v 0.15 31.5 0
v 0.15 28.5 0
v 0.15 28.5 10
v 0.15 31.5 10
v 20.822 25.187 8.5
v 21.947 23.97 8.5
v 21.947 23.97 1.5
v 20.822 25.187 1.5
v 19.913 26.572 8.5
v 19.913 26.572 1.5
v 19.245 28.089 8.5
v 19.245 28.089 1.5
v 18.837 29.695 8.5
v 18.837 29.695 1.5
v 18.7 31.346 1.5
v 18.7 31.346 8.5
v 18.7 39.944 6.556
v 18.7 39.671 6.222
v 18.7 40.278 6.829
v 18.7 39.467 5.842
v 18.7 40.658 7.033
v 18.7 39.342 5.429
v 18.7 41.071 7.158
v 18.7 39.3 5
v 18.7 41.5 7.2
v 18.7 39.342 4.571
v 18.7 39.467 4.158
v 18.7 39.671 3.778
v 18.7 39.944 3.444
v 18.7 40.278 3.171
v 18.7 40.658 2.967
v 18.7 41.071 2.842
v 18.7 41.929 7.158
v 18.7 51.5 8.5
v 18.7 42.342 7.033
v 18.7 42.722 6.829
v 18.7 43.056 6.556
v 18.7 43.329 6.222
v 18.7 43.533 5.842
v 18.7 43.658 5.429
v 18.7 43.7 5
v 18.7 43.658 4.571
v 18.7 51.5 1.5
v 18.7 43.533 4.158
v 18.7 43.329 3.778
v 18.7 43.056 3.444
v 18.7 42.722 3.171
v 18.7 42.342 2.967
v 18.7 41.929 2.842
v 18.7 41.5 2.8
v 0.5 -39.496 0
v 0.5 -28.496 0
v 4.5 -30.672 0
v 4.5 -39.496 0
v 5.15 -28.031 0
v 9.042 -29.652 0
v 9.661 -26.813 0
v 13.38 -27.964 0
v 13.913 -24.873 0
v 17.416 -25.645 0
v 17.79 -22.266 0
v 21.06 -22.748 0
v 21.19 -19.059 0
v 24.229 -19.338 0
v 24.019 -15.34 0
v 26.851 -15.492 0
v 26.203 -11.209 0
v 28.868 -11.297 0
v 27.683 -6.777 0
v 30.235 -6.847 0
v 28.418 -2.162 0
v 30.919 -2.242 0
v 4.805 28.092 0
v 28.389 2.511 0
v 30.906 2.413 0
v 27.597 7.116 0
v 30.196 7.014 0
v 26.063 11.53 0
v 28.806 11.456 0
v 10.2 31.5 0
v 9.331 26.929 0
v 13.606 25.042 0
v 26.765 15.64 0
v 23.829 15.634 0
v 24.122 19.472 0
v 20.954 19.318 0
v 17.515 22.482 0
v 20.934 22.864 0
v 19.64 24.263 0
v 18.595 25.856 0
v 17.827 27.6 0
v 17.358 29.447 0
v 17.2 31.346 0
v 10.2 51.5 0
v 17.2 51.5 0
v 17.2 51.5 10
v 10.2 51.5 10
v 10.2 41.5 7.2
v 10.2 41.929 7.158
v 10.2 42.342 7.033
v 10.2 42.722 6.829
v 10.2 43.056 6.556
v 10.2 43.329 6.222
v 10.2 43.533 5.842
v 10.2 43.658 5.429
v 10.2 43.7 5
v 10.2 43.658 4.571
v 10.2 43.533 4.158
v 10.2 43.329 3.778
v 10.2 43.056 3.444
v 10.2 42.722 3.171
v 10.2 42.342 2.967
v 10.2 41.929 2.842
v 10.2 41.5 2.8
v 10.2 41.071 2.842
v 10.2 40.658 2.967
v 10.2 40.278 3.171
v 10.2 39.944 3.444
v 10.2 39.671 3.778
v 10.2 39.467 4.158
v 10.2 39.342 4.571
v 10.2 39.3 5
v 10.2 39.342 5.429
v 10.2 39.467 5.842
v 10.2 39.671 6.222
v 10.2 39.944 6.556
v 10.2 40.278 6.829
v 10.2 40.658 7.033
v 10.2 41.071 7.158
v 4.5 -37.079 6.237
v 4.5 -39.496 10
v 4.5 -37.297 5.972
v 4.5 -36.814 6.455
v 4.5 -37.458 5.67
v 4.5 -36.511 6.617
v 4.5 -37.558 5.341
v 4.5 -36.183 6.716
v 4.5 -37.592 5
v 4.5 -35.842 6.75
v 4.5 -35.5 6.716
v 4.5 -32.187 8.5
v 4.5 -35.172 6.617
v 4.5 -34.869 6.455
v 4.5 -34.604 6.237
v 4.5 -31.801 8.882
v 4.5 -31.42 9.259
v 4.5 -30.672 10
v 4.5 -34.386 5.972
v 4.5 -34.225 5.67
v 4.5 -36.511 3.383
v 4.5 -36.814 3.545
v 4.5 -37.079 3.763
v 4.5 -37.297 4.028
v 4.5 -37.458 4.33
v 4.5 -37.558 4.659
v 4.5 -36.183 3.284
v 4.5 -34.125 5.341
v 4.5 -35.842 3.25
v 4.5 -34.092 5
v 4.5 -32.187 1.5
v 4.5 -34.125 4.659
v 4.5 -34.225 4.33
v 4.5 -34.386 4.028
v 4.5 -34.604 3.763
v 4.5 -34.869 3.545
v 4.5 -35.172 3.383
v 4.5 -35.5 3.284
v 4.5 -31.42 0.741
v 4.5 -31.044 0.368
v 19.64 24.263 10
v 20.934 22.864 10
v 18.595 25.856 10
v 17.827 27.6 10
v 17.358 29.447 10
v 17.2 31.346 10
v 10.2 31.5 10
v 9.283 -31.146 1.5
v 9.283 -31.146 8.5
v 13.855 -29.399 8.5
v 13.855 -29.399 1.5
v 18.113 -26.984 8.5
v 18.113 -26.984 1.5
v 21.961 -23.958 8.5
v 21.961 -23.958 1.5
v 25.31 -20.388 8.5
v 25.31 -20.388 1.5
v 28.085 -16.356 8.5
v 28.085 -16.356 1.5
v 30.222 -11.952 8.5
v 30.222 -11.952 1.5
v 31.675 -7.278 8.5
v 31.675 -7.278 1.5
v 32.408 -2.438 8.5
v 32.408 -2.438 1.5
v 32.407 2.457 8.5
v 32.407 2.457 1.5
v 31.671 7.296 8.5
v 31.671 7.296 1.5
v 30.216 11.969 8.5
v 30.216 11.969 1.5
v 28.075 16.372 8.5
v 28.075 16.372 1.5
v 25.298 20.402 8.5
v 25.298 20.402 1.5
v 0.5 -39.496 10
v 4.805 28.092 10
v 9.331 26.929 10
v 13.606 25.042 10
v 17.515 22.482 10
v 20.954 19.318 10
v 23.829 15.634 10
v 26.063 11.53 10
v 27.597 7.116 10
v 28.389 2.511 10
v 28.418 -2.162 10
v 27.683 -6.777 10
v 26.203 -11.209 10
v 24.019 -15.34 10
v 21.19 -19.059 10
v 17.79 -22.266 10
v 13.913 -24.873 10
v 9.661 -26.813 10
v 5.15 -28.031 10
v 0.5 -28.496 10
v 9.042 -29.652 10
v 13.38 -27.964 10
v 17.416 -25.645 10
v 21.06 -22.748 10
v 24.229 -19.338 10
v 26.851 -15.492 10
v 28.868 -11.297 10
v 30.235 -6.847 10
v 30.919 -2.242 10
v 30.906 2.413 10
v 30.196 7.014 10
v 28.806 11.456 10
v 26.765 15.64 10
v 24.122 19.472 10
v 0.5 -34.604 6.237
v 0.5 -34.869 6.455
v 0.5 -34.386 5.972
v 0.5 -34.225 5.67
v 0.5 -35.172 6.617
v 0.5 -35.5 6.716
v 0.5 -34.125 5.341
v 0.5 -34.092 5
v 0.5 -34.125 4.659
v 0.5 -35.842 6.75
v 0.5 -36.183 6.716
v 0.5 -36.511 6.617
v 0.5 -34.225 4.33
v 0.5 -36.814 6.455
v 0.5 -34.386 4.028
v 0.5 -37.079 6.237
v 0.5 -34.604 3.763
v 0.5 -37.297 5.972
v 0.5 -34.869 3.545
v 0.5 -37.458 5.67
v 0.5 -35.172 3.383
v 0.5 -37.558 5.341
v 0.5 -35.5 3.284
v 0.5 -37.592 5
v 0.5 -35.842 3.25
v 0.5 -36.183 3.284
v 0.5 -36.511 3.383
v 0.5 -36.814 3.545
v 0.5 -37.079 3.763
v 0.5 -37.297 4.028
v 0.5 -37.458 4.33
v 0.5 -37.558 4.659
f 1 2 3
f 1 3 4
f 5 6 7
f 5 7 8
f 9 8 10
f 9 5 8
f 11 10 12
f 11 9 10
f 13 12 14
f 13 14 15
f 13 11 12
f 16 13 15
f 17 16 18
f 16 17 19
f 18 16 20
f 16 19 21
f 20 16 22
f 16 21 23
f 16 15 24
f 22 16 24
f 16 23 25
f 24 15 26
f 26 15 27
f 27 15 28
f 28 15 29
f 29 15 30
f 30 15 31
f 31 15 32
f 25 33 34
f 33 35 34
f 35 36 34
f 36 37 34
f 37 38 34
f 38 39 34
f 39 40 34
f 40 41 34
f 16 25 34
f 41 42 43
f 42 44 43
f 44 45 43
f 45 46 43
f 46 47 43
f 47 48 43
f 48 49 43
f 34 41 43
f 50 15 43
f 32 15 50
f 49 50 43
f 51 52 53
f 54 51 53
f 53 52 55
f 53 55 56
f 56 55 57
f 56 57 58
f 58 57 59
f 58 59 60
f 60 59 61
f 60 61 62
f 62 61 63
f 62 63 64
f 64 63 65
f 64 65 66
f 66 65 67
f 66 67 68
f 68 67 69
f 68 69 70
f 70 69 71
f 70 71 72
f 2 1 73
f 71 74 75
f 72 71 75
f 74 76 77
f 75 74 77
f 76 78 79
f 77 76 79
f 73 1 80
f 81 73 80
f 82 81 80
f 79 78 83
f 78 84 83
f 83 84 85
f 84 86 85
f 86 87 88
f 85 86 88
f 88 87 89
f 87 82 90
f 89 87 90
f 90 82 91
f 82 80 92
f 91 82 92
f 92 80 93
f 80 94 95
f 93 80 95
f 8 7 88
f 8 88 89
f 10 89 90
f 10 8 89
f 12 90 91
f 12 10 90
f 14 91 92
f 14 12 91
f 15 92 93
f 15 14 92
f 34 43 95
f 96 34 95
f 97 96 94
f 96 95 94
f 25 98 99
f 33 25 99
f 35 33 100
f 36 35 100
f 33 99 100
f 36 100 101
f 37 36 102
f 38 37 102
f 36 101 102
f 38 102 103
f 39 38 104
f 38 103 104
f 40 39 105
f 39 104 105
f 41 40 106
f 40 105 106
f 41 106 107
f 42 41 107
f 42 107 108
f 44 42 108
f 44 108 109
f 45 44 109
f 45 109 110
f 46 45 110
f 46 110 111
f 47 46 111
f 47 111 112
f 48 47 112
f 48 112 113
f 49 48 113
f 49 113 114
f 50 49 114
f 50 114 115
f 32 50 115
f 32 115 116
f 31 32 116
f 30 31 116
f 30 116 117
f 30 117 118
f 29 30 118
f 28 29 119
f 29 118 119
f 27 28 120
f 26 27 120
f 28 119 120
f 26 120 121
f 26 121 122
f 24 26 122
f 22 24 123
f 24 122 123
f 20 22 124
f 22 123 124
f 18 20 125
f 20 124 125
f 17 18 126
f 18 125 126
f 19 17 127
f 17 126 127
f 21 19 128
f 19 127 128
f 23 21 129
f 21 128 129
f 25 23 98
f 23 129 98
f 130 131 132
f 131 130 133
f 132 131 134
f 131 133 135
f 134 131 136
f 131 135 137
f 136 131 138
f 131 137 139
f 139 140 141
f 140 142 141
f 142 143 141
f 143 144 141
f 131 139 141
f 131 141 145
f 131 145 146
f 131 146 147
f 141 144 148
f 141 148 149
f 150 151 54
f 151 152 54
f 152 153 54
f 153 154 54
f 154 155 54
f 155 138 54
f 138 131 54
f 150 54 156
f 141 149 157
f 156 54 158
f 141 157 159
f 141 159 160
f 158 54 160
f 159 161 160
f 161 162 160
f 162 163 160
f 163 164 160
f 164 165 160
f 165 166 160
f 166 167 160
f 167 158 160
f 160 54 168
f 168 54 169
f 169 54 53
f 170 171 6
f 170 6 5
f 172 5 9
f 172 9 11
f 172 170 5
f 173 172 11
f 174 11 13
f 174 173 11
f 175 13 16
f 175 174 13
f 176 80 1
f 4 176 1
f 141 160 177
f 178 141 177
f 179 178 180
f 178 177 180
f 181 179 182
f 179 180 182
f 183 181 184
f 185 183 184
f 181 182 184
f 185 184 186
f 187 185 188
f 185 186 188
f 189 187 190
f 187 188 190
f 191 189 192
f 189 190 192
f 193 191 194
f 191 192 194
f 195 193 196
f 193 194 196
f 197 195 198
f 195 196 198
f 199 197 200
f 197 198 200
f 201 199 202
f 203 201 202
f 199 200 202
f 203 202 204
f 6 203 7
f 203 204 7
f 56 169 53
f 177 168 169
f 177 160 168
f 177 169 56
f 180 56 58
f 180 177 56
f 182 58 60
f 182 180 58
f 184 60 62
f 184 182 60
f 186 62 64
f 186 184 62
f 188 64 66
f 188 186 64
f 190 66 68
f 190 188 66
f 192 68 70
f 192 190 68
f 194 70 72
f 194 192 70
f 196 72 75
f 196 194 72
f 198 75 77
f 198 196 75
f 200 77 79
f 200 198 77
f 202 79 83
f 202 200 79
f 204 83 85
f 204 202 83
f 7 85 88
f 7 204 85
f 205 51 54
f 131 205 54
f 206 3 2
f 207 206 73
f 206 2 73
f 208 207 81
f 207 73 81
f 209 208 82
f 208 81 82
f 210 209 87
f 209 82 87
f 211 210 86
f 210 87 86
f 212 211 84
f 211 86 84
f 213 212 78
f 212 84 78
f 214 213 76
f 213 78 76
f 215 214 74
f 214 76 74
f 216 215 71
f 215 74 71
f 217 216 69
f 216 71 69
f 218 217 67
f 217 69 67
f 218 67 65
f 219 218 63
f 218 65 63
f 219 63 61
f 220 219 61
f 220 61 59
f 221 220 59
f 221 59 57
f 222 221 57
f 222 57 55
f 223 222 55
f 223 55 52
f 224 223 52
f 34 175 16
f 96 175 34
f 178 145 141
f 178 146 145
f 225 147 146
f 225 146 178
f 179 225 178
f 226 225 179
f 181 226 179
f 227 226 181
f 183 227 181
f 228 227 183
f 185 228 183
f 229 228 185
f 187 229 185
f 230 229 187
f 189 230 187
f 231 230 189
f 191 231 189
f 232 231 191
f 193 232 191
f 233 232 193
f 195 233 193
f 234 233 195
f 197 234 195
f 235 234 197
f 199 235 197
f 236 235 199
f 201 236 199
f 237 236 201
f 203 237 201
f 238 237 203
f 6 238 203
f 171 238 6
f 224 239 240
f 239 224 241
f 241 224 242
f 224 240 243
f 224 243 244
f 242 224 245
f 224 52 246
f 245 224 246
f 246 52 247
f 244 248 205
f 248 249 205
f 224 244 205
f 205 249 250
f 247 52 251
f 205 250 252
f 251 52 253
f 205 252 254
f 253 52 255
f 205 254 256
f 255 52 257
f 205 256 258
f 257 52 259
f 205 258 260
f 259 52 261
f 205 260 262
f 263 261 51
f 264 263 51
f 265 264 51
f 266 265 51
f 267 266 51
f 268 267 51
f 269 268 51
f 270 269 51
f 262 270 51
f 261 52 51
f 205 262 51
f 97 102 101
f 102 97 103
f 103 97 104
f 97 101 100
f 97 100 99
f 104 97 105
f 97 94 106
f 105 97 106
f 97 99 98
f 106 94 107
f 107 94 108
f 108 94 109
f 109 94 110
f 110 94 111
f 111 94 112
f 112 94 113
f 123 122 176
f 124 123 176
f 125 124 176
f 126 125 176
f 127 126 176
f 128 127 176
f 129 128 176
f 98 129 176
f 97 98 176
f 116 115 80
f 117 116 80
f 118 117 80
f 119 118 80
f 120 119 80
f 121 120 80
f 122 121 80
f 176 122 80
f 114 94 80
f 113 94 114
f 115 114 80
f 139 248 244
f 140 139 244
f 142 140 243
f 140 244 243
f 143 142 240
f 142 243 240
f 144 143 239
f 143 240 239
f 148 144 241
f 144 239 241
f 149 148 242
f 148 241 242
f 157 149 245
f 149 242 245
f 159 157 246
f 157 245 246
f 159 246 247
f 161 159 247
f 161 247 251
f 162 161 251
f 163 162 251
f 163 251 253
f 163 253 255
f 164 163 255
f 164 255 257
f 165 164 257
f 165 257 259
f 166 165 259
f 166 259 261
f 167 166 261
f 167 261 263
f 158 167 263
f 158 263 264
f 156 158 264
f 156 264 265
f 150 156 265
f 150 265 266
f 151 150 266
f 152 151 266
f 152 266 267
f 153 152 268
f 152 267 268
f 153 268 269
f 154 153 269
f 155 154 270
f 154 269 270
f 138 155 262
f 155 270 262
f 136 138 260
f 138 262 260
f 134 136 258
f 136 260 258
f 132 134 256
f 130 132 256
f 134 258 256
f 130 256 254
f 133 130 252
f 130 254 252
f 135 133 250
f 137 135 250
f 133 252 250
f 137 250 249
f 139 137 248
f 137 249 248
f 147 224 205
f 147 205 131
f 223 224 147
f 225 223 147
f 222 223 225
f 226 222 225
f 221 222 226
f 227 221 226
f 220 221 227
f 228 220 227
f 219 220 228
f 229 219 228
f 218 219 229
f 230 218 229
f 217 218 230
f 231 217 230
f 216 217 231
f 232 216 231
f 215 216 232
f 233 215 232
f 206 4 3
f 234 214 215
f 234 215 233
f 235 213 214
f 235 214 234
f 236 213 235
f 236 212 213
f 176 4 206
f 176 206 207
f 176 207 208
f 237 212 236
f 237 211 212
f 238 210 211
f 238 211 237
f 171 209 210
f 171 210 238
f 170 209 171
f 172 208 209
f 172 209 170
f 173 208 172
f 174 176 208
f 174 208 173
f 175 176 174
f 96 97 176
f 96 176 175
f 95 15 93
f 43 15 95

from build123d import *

# Parameters (mm, degrees)
AUFSATZ_LINEAR_AUSTRAGEN1_DEPTH = 10
SKIZZE2_R                       = 1.75
SCHNITT_LINEAR_AUSTRAGEN1_DEPTH = 38
SKIZZE4_R                       = 2.2
SCHNITT_LINEAR_AUSTRAGEN3_DEPTH = 52.2
VERRUNDUNG1_R                   = 10
SKIZZE5_W                       = 5.5
SKIZZE5_H                       = 5.5
SCHNITT_LINEAR_AUSTRAGEN4_DEPTH = 2
FASE1_SIZE                      = 1.5
SCHNITT_LINEAR_AUSTRAGEN5_DEPTH = 11


with BuildPart() as part:
    # Skizze1 → Aufsatz-Linear austragen1 (new body)
    with BuildSketch(Plane.XY):
        with BuildLine():
            Line((0.5, -28.495613698), (0.5, -32.496153619))
            Line((0.5, -32.496153619), (0.5, -39.496153619))
            Line((0.5, -39.496153619), (4.5, -39.496153619))
            Line((4.5, -39.496153619), (4.5, -32.186953879))
            ThreePointArc((4.5, -32.186953879), (31.590882714, -7.633225356), (18.7, 26.581196361))
            Line((18.7, 26.581196361), (18.7, 51.5))
            Line((18.7, 51.5), (10.2, 51.5))
            Line((10.2, 51.5), (10.2, 31.5))
            Line((10.2, 31.5), (-10.2, 31.5))
            Line((-10.2, 31.5), (-10.2, 51.5))
            Line((-10.2, 51.5), (-18.7, 51.5))
            Line((-18.7, 51.5), (-18.7, 26.581196361))
            ThreePointArc((-18.7, 26.581196361), (-31.590882714, -7.633225356), (-4.5, -32.186953879))
            Line((-4.5, -32.186953879), (-4.5, -39.496153619))
            Line((-4.5, -39.496153619), (-0.5, -39.496153619))
            Line((-0.5, -39.496153619), (-0.5, -32.496153619))
            Line((-0.5, -32.496153619), (-0.5, -28.495613698))
            ThreePointArc((-0.5, -28.495613698), (0, 28.5), (0.5, -28.495613698))
        make_face()
    extrude(amount=AUFSATZ_LINEAR_AUSTRAGEN1_DEPTH)

    # Skizze2 → Schnitt-Linear austragen1 (cut, through all)
    with BuildSketch(Plane.ZY.offset(4.5)):
        with Locations((5, -35.841553749)):
            Circle(SKIZZE2_R)
    extrude(amount=-SCHNITT_LINEAR_AUSTRAGEN1_DEPTH, mode=Mode.SUBTRACT)

    # Skizze4 → Schnitt-Linear austragen3 (cut, through all)
    with BuildSketch(Plane.ZY.offset(18.7)):
        with Locations((5, 41.5)):
            Circle(SKIZZE4_R)
    extrude(amount=-SCHNITT_LINEAR_AUSTRAGEN3_DEPTH, mode=Mode.SUBTRACT)

    # Verrundung1
    verrundung1_edges = [part.edges().sort_by_distance(p)[0] for p in [
        (-18.7, 26.581196361, 5),
        (18.7, 26.581196361, 5),
    ]]
    fillet(verrundung1_edges, radius=VERRUNDUNG1_R)

    # Skizze5 → Schnitt-Linear austragen4 (cut)
    with BuildSketch(Plane.ZY.offset(4.5)):
        with Locations((5, -35.841553749)):
            Rectangle(SKIZZE5_W, SKIZZE5_H)
    extrude(amount=-SCHNITT_LINEAR_AUSTRAGEN4_DEPTH, mode=Mode.SUBTRACT)

    # Fase1
    fase1_edges = [part.edges().sort_by_distance(p)[0] for p in [
        (-18.7, 41.422906559, 0),
        (31.036620275, -9.642520517, 0),
        (-18.7, 41.422906559, 10),
        (18.7, 41.422906559, 0),
        (18.7, 41.422906559, 10),
        (31.036620275, -9.642520517, 10),
        (-31.036620275, -9.642520517, 0),
        (-31.036620275, -9.642520517, 10),
        (19.547693958, 27.316508696, 0),
        (19.547693958, 27.316508696, 10),
        (-19.547693958, 27.316508696, 0),
        (-19.547693958, 27.316508696, 10),
    ]]
    chamfer(fase1_edges, length=FASE1_SIZE)

    # Skizze6 → Schnitt-Linear austragen5 (cut, through all)
    with BuildSketch(Plane.XY):
        Polygon((0, -82.914559746), (0, 27.830541285), (0.15, 27.830541285), (0.15, 32.208374164), (0, 32.208374164), (0, 82.914559746), (-62.169798489, 71.020337849), (-62.169798489, -54.918482242), align=None)
    extrude(amount=SCHNITT_LINEAR_AUSTRAGEN5_DEPTH, mode=Mode.SUBTRACT)


solid = part.part
